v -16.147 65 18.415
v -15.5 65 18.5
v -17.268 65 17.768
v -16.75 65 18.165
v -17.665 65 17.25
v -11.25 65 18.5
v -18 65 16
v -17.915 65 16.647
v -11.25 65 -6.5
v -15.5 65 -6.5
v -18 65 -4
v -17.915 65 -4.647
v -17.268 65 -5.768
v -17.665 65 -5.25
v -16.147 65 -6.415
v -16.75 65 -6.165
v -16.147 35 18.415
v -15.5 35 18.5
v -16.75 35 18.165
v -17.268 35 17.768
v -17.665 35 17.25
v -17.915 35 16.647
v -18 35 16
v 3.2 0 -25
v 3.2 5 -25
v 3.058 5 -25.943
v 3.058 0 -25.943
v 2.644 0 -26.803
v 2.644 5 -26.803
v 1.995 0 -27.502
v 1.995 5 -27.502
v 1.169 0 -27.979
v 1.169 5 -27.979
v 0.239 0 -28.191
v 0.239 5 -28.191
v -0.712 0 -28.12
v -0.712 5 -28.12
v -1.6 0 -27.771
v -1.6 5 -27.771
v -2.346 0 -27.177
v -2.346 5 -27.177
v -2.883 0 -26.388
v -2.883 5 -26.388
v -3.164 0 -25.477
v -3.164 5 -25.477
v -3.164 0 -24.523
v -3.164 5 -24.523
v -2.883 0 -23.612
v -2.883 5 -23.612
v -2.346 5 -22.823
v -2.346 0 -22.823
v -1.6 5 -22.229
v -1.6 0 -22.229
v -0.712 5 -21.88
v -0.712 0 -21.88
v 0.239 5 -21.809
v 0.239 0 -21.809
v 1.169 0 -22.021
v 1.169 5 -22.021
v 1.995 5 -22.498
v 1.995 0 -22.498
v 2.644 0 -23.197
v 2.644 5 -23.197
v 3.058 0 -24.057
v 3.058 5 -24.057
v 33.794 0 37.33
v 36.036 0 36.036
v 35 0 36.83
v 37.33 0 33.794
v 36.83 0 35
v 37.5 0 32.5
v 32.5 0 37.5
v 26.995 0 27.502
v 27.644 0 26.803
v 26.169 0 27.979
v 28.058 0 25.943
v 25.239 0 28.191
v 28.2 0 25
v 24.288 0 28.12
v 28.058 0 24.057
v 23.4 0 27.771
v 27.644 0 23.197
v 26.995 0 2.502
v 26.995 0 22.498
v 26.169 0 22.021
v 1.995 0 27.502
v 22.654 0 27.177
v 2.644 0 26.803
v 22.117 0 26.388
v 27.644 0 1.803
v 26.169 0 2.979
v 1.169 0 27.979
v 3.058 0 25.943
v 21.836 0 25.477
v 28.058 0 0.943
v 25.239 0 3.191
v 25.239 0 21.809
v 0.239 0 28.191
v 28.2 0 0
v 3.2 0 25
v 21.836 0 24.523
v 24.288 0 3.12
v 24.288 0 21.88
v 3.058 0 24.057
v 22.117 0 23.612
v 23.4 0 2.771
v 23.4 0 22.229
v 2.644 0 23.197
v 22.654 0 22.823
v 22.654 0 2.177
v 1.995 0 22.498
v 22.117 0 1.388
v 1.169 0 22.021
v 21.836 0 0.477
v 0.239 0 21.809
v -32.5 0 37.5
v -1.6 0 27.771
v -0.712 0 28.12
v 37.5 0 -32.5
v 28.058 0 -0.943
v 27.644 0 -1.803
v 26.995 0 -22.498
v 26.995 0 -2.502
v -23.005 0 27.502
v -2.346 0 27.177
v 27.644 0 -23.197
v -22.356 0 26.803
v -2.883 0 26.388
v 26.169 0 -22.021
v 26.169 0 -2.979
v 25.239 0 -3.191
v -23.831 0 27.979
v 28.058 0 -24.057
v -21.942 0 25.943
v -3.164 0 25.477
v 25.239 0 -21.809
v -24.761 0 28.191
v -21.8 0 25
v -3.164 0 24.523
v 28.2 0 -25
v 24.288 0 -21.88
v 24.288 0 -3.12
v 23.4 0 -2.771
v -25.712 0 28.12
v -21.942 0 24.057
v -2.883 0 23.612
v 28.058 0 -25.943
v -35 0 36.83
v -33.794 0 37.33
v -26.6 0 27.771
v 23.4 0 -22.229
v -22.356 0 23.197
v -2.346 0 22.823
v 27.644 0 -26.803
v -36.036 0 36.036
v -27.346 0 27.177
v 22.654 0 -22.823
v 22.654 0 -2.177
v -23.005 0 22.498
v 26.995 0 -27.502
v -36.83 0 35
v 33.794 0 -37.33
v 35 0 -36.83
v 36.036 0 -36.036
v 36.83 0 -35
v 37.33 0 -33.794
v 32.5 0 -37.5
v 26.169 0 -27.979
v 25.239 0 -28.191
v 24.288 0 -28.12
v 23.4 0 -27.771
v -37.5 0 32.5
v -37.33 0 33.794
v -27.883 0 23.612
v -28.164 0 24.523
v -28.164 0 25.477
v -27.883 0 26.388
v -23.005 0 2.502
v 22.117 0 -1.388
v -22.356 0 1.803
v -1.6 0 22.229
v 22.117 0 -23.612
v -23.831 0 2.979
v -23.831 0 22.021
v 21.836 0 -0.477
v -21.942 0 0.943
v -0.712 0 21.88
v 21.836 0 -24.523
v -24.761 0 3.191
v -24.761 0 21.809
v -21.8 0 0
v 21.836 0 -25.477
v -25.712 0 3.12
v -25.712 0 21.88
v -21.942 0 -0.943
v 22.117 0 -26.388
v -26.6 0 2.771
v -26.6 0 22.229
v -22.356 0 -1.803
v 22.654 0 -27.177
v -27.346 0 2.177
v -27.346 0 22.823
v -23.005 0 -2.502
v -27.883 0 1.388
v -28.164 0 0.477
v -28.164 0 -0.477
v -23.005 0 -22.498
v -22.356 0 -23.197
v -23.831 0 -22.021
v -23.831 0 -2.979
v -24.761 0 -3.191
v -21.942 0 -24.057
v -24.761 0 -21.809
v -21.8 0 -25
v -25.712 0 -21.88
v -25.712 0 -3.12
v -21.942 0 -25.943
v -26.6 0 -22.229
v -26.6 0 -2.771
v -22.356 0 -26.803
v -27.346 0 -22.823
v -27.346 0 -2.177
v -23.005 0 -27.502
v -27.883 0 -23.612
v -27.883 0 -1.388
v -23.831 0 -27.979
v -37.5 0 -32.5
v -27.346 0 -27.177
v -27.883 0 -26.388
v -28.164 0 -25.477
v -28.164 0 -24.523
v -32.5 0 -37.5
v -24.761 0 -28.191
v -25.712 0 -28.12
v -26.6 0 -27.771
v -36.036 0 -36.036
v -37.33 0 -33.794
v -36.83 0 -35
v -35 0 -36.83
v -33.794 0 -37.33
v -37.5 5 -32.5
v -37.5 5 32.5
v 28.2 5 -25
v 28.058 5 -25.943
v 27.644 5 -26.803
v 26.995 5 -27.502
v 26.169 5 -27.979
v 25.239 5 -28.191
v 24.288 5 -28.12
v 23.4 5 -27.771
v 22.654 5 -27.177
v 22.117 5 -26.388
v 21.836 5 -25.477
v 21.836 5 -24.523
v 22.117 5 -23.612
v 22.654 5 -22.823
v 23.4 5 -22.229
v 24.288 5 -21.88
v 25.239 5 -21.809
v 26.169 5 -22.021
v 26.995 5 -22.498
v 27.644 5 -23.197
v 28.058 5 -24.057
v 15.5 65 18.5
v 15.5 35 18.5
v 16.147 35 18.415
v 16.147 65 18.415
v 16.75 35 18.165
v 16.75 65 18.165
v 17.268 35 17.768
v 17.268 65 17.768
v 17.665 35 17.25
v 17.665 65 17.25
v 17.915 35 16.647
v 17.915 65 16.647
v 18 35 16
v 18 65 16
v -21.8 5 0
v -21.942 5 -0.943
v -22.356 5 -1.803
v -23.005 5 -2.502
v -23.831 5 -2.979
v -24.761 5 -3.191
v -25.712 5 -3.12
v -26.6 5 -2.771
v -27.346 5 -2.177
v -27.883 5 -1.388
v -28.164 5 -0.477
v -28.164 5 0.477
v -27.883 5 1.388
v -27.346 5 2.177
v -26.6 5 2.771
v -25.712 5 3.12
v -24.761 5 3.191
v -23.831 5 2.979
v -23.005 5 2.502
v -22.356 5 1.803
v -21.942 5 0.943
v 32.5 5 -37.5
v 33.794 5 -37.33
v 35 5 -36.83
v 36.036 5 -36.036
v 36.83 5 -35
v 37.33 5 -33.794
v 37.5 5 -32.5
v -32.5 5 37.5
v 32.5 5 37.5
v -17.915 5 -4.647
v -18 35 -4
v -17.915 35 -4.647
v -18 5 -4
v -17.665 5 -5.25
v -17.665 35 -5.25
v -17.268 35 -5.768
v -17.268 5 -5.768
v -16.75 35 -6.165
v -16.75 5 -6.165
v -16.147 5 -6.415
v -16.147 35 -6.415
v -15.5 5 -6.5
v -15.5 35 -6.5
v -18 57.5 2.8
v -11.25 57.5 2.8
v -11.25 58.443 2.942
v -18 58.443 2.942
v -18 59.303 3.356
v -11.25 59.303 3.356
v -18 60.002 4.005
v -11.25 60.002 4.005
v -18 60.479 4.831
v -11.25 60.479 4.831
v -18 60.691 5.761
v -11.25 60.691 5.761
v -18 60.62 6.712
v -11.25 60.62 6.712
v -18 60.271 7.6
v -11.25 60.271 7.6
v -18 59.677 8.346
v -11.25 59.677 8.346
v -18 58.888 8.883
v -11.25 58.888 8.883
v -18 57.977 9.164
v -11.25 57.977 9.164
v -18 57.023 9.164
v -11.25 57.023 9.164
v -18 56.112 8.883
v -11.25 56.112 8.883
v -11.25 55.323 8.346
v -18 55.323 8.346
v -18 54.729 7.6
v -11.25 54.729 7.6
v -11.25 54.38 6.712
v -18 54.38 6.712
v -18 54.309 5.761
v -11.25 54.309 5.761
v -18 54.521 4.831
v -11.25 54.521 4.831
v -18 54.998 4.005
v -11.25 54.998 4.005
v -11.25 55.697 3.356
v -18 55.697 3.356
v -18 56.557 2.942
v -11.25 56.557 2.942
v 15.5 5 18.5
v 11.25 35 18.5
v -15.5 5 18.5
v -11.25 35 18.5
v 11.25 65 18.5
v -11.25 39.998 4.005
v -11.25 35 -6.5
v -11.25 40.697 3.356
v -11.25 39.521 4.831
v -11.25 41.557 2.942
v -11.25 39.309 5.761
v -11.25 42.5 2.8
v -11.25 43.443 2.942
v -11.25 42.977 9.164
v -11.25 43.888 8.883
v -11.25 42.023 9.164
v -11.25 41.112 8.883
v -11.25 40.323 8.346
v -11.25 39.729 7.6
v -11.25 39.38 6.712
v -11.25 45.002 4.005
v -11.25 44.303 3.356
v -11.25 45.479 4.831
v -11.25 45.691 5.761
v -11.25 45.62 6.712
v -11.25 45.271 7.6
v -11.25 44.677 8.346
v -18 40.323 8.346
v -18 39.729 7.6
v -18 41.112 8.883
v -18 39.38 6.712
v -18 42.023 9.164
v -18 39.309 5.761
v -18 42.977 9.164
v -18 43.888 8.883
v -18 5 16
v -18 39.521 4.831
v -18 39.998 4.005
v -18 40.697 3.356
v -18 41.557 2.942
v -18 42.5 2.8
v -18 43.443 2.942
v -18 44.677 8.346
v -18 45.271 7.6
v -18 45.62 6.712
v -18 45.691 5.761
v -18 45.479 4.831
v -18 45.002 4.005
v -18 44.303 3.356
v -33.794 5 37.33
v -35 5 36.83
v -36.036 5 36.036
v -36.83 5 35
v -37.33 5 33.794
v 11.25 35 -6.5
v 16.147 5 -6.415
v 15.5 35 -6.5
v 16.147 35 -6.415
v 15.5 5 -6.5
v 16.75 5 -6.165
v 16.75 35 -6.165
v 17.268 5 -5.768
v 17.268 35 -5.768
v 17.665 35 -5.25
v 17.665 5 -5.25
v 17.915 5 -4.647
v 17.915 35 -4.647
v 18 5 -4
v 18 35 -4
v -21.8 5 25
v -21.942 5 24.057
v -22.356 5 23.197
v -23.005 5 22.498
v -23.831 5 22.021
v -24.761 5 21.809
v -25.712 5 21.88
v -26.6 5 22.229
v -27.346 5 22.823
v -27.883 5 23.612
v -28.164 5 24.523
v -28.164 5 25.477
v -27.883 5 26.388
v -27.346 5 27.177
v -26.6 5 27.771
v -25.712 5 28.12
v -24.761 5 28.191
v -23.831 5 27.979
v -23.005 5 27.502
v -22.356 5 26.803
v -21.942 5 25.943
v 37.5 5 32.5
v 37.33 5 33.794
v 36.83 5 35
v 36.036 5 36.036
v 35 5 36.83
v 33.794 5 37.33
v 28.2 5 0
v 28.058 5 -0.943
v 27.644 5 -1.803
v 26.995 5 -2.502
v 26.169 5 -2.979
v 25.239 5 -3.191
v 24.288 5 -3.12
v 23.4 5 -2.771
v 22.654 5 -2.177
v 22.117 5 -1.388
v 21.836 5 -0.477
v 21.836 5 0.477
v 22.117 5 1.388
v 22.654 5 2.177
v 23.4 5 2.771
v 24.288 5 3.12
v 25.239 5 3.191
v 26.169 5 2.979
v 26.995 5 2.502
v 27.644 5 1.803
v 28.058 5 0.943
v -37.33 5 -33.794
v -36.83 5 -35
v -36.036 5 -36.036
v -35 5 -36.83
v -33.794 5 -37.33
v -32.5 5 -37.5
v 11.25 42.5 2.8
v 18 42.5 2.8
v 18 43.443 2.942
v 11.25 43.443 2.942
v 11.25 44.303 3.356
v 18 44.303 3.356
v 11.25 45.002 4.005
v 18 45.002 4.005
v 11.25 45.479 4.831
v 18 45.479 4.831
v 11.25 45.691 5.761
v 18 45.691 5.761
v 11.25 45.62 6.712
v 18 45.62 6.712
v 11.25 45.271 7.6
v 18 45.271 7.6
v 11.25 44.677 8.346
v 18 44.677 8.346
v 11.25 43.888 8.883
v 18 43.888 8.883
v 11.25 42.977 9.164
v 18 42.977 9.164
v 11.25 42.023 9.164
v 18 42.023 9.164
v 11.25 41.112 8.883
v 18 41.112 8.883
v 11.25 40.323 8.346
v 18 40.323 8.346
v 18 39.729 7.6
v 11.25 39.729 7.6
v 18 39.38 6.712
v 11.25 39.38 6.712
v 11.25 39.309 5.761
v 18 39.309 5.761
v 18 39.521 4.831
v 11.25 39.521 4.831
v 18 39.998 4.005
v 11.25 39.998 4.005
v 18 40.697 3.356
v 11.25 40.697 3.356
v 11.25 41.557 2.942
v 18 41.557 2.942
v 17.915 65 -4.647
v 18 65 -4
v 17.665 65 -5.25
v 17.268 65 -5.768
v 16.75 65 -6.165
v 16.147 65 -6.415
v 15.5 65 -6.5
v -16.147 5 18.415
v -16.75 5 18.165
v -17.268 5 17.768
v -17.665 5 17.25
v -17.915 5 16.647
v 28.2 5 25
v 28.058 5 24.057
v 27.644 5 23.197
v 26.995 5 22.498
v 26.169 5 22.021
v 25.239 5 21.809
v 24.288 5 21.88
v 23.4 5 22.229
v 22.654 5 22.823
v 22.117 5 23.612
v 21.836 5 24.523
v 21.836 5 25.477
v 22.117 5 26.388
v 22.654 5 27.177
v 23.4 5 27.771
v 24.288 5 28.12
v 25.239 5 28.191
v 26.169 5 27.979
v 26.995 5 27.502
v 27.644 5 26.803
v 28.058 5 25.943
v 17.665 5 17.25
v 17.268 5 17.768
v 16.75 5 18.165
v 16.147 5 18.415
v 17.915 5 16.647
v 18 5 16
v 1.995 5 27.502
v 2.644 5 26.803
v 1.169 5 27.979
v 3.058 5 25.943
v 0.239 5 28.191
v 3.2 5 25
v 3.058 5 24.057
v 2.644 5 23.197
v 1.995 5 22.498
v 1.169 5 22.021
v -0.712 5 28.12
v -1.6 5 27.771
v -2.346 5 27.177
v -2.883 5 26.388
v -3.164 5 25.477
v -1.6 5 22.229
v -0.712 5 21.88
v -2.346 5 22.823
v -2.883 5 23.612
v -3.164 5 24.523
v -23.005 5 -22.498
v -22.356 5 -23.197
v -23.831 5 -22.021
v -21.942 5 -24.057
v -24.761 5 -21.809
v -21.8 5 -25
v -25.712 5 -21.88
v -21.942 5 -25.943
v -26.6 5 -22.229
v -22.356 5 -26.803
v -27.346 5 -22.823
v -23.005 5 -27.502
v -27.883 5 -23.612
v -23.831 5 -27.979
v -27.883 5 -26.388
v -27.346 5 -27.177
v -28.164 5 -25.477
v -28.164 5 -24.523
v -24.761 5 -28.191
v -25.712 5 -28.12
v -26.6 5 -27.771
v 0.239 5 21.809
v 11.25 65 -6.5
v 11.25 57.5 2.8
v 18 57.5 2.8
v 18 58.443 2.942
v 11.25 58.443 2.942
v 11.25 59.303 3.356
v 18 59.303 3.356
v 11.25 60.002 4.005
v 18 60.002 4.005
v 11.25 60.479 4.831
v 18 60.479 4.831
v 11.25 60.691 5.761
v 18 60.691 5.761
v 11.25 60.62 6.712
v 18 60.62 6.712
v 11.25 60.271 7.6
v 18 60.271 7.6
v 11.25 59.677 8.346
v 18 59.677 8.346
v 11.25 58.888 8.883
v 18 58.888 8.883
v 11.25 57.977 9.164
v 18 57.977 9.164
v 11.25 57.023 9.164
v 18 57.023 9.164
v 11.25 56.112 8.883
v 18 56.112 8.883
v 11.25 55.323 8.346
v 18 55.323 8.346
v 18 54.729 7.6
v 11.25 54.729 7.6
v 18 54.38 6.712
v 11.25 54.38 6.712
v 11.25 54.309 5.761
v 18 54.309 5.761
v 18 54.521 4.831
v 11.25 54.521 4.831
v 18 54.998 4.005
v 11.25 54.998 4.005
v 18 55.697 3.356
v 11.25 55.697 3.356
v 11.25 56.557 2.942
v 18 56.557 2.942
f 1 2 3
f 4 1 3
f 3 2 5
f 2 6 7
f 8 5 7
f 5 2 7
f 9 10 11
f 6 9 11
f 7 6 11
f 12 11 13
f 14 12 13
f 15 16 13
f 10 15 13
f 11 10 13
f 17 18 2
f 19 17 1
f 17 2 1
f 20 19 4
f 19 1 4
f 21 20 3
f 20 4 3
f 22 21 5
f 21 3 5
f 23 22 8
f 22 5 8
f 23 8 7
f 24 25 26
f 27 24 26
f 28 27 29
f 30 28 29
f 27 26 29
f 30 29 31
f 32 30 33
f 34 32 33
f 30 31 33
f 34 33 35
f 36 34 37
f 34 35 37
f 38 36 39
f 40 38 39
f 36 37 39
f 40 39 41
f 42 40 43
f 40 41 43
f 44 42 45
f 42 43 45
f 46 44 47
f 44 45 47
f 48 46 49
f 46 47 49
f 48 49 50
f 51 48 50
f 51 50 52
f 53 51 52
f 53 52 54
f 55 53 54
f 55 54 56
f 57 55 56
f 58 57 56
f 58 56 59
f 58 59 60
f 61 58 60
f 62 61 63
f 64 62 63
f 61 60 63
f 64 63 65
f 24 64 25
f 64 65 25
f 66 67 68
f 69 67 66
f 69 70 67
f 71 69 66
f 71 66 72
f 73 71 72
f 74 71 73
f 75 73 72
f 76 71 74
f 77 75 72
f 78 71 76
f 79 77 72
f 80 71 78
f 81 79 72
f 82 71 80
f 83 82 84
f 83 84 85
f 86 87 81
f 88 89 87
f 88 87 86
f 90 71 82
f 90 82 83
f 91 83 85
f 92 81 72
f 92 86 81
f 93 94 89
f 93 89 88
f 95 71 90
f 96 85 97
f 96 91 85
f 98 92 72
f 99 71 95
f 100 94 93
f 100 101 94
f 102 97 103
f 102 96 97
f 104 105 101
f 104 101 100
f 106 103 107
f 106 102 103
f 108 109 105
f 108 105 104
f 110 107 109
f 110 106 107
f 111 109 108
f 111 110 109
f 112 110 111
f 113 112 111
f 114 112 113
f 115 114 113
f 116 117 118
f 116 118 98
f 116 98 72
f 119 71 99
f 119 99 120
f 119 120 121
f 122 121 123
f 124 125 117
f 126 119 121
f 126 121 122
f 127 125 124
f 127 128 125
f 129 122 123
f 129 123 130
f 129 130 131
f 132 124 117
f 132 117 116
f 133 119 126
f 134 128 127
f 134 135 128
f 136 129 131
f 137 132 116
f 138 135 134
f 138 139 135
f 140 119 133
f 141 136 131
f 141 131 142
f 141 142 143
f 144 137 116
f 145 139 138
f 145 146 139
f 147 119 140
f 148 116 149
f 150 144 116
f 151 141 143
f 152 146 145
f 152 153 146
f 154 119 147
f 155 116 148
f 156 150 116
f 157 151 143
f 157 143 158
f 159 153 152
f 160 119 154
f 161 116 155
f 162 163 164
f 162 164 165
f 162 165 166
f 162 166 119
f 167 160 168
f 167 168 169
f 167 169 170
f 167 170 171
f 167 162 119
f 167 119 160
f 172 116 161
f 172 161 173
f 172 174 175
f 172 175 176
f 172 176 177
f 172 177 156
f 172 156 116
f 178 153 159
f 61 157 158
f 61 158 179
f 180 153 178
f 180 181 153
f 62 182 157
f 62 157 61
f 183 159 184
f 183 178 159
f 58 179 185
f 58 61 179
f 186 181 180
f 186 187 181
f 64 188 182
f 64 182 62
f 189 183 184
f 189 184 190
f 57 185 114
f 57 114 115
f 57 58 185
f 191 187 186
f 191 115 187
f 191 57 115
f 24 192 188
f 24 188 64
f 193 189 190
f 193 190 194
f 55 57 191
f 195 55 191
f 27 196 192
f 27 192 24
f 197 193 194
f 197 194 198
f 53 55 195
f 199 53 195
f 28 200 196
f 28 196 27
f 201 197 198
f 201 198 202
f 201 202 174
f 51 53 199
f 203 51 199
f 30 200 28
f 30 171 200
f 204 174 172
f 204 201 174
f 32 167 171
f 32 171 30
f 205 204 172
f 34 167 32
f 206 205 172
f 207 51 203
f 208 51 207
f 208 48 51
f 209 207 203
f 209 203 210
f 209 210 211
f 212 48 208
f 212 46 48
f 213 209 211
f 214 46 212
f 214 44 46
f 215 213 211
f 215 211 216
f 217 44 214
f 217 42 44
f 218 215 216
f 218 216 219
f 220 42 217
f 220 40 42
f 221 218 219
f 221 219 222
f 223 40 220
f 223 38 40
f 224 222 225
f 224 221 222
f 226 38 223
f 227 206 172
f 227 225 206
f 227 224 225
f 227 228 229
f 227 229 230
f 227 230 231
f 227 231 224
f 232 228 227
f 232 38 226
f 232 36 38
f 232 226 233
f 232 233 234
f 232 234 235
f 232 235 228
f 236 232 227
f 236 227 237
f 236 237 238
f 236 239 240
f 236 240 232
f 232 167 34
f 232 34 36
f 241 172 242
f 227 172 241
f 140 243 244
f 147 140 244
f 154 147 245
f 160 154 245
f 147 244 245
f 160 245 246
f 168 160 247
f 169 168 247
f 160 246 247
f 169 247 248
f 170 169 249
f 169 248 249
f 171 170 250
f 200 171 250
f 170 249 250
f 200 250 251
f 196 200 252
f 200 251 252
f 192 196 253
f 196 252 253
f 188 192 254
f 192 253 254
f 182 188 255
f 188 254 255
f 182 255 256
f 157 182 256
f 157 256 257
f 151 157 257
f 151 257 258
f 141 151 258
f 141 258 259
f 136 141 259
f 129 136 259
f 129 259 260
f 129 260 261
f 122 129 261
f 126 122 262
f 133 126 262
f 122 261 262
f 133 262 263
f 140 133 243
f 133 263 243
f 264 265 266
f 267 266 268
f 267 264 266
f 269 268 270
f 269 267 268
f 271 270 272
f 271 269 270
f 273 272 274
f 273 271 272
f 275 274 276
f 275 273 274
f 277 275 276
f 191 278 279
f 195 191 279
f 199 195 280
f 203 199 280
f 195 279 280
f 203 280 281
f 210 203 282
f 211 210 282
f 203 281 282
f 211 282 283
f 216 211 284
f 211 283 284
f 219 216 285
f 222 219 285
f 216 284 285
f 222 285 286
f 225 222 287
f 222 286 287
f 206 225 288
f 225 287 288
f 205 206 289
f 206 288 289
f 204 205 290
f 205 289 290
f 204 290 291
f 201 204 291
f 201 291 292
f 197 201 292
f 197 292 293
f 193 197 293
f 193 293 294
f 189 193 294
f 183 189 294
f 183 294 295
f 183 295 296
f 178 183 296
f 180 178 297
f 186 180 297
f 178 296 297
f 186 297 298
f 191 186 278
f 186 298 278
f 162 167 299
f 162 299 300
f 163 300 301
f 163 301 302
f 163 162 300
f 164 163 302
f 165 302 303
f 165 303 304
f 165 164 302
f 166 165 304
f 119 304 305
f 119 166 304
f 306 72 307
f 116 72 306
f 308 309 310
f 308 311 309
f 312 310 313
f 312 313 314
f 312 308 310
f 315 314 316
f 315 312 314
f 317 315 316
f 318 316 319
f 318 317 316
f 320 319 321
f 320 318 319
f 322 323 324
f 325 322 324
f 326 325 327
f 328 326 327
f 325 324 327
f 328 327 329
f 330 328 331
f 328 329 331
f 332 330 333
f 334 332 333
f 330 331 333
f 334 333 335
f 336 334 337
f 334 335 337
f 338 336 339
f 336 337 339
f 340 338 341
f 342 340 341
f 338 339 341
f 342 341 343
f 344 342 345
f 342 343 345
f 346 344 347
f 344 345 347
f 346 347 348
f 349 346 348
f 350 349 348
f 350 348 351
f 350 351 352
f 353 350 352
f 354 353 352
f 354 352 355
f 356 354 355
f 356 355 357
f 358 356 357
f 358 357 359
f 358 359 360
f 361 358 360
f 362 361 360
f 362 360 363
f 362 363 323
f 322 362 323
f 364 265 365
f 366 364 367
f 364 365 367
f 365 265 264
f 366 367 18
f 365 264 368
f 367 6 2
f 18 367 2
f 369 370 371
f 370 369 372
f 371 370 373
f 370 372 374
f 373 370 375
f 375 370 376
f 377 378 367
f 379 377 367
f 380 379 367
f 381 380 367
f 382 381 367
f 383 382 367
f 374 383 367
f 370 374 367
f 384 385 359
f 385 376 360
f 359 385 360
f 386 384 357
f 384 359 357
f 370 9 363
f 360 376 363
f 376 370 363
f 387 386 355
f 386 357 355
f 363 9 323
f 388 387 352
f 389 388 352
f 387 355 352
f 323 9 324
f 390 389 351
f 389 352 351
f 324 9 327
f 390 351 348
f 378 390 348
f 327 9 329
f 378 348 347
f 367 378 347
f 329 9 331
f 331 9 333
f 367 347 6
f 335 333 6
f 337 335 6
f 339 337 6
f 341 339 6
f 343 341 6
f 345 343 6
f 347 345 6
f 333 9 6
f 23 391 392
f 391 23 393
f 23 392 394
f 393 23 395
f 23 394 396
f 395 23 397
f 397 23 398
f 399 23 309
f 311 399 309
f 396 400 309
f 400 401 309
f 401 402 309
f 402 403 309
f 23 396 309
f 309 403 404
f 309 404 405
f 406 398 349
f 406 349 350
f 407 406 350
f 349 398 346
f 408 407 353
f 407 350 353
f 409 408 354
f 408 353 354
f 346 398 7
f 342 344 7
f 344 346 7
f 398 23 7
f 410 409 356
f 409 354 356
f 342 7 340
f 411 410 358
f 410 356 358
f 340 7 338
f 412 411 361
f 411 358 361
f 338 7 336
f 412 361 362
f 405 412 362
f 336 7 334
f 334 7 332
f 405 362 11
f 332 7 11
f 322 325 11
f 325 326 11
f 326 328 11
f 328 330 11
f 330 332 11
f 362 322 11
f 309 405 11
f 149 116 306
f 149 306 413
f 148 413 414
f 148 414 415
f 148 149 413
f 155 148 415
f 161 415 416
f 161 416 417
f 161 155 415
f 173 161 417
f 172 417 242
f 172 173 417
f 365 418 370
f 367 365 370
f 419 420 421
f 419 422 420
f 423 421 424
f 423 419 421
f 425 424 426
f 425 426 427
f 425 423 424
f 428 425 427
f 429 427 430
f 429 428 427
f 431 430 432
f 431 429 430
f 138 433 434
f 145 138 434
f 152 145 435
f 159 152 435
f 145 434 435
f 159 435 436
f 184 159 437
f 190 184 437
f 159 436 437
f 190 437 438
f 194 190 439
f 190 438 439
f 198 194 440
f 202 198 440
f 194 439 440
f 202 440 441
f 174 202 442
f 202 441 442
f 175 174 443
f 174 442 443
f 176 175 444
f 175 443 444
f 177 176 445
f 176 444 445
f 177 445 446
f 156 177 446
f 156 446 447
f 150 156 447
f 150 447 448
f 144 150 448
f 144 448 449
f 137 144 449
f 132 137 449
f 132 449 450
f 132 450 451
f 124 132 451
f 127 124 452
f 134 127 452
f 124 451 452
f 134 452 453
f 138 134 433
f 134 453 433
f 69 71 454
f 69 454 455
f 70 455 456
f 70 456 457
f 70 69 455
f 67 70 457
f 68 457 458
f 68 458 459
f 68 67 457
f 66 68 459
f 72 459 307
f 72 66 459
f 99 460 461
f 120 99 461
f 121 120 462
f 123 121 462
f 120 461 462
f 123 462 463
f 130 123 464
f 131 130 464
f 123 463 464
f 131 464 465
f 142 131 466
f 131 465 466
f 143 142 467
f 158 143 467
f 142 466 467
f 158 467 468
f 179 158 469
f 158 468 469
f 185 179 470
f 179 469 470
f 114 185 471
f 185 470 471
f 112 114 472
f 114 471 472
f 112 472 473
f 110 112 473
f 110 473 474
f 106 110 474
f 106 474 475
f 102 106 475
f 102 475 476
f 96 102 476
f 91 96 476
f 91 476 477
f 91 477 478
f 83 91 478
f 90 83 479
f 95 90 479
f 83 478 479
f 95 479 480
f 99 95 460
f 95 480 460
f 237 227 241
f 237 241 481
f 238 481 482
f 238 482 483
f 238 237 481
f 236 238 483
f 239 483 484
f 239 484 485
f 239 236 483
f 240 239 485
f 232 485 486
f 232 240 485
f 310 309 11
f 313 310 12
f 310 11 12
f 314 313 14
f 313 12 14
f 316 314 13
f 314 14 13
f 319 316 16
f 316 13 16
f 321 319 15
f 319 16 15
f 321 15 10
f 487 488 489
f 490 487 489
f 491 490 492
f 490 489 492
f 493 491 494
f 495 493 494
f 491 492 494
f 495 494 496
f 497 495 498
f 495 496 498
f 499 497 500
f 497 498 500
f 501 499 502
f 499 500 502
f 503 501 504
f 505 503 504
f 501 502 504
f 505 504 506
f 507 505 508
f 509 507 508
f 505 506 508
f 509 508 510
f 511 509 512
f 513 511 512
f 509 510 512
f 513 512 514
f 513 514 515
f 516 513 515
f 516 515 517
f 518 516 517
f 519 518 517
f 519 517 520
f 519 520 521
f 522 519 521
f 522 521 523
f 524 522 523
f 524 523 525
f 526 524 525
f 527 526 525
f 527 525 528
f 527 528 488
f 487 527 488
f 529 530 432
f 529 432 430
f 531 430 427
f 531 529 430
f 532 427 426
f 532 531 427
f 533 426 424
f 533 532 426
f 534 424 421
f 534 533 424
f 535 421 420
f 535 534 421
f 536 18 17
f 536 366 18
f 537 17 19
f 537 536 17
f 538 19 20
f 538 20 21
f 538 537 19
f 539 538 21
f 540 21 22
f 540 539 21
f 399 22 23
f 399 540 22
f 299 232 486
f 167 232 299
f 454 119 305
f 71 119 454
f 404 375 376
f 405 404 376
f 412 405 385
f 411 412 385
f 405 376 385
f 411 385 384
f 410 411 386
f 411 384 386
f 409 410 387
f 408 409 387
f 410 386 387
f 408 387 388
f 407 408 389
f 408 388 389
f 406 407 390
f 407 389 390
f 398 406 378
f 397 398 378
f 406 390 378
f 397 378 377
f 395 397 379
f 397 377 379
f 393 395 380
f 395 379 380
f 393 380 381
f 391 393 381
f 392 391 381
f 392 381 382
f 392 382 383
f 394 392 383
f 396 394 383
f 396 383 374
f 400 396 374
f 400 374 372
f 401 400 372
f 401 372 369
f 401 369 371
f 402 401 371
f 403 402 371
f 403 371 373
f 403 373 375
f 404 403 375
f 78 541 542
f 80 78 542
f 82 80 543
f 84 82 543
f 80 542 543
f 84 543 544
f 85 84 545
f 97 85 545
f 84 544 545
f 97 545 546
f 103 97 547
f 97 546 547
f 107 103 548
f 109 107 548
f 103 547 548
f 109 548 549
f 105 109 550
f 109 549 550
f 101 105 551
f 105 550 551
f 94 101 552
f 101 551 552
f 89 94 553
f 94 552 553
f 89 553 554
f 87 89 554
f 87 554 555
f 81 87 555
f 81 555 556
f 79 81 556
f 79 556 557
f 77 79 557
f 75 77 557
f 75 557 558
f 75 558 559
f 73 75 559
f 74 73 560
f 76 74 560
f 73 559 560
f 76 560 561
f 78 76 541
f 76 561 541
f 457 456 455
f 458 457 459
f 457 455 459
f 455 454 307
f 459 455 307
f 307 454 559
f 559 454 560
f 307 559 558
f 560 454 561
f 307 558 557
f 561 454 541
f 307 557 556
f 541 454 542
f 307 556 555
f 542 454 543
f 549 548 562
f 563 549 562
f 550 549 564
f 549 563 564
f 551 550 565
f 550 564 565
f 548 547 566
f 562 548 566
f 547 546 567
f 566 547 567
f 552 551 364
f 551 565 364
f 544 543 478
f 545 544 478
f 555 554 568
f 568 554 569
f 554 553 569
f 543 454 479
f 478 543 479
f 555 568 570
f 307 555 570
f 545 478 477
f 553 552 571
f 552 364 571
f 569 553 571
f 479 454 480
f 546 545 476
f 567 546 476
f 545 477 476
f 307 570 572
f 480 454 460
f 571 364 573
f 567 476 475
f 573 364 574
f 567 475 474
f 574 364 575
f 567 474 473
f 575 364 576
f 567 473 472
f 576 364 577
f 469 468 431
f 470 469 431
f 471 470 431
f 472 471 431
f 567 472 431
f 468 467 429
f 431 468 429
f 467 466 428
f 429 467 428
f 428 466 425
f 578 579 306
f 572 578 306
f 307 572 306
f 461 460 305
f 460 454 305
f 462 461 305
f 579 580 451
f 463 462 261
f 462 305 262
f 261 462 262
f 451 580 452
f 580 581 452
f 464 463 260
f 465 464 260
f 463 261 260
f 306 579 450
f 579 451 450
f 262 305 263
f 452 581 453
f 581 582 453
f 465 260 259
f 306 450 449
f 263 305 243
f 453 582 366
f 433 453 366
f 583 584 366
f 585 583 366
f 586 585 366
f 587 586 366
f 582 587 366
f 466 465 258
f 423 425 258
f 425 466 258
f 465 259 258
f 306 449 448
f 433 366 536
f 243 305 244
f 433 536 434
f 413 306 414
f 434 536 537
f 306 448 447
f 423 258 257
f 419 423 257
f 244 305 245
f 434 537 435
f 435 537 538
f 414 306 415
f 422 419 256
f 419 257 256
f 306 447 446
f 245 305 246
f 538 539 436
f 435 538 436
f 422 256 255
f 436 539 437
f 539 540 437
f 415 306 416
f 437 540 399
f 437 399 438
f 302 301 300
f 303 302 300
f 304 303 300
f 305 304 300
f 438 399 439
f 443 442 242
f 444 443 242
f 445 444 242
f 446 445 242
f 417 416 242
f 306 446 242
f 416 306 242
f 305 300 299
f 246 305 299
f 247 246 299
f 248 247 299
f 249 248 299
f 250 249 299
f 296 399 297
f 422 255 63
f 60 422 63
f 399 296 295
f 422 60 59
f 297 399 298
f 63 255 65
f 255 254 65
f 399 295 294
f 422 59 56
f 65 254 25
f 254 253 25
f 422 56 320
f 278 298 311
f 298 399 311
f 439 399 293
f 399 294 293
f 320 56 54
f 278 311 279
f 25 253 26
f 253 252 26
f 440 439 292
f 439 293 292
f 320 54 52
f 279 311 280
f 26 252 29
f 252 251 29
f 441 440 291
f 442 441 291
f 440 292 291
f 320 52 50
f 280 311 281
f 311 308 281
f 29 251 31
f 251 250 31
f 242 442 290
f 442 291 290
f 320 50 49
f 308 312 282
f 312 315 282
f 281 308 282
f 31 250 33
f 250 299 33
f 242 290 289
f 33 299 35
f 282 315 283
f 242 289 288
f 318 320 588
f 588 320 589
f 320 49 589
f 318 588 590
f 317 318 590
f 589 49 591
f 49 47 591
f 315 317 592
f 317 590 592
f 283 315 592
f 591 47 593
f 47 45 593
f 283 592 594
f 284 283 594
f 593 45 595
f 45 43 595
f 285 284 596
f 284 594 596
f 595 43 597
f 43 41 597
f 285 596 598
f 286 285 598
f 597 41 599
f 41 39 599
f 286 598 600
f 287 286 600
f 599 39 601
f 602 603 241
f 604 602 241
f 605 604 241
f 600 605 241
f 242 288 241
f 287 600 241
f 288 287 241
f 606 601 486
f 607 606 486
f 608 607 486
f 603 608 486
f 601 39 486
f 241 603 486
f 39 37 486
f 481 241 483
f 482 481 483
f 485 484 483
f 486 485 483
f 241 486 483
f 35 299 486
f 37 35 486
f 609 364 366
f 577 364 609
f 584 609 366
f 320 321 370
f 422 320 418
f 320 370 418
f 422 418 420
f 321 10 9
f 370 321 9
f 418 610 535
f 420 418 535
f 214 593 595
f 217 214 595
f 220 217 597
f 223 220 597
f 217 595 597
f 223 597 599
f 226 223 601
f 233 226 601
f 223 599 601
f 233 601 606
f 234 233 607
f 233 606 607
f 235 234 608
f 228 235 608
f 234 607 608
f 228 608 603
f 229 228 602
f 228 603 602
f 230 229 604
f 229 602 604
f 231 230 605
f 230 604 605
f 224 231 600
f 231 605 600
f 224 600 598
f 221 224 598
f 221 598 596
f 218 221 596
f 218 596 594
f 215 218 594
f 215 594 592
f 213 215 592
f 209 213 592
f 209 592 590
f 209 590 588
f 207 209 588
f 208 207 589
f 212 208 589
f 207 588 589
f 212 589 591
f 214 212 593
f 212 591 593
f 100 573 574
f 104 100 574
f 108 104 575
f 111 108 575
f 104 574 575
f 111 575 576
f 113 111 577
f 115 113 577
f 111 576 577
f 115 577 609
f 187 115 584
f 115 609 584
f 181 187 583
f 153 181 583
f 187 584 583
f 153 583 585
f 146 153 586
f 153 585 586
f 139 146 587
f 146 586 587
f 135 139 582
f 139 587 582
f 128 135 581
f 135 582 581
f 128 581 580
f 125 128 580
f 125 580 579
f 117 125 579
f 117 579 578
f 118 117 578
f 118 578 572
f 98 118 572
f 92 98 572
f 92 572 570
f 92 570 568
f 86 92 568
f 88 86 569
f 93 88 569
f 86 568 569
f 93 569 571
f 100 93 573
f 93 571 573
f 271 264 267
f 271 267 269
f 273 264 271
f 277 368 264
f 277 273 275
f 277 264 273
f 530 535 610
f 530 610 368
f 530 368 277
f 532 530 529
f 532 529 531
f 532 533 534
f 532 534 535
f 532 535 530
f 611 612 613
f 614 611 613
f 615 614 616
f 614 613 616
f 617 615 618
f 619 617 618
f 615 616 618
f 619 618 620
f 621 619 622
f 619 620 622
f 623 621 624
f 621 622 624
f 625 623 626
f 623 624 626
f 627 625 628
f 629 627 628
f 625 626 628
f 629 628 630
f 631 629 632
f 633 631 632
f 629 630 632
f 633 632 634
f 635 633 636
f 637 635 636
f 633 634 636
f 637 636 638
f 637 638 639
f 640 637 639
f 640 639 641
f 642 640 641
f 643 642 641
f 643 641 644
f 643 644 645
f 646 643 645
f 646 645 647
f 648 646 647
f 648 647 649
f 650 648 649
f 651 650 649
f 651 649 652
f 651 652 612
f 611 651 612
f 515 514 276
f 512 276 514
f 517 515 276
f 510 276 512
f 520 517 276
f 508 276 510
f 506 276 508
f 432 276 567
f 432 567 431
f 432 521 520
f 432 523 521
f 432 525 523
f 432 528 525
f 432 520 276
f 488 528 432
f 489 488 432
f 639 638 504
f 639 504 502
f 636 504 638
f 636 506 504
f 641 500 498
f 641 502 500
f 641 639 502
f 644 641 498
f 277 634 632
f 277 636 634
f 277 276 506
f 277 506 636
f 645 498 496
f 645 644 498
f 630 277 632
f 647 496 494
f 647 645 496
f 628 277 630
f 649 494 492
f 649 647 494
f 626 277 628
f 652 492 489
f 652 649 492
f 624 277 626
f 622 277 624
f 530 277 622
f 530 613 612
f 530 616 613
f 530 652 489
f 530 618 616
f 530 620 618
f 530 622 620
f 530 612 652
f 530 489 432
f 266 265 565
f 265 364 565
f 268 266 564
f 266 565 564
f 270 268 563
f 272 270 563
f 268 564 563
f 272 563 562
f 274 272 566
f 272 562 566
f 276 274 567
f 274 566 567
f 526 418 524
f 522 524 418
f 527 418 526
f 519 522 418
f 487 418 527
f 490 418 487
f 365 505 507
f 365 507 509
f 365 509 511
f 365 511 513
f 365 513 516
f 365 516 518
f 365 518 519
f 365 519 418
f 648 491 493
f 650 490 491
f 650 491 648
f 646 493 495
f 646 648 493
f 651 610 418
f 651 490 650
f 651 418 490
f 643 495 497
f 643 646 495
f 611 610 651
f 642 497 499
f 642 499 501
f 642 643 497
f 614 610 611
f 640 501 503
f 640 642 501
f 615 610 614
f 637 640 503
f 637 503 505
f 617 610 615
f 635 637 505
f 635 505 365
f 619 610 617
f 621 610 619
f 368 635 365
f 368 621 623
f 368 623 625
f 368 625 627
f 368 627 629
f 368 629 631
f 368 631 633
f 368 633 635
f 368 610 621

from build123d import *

# Parameters (mm, degrees)
EXTRUDE_2_DEPTH     = 5
SKETCH_2_R          = 3.2
CUT_EXTRUDE_1_DEPTH = 5
SKETCH_4_W          = 36
SKETCH_4_H          = 25
EXTRUDE_3_DEPTH     = 30
FILLET_1_R          = 2.5
EXTRUDE_4_DEPTH     = 30
SKETCH_6_R          = 3.2
CUT_EXTRUDE_2_DEPTH = 36


with BuildPart() as part:
    # 스케치1 → 보스-돌출2 (new body)
    with BuildSketch(Plane(origin=(0, 0, 0), x_dir=(1, 0, 0), z_dir=(0, 1, 0))):
        with BuildLine():
            Line((-32.5, 37.5), (32.5, 37.5))
            ThreePointArc((32.5, 37.5), (36.035533906, 36.035533906), (37.5, 32.5))
            Line((37.5, 32.5), (37.5, -32.5))
            ThreePointArc((37.5, -32.5), (36.035533906, -36.035533906), (32.5, -37.5))
            Line((32.5, -37.5), (-32.5, -37.5))
            ThreePointArc((-32.5, -37.5), (-36.035533906, -36.035533906), (-37.5, -32.5))
            Line((-37.5, -32.5), (-37.5, 32.5))
            ThreePointArc((-37.5, 32.5), (-36.035533906, 36.035533906), (-32.5, 37.5))
        make_face()
    extrude(amount=EXTRUDE_2_DEPTH)

    # 스케치2 → 컷-돌출1 (cut)
    with BuildSketch(Plane(origin=(0, 5, 0), x_dir=(1, 0, 0), z_dir=(0, 1, 0))):
        with Locations((0, 25)):
            Circle(SKETCH_2_R)
        with Locations((-25, 25)):
            Circle(SKETCH_2_R)
        with Locations((-25, 0)):
            Circle(SKETCH_2_R)
        with Locations((-25, -25)):
            Circle(SKETCH_2_R)
        with Locations((0, -25)):
            Circle(SKETCH_2_R)
        with Locations((25, -25)):
            Circle(SKETCH_2_R)
        with Locations((25, 0)):
            Circle(SKETCH_2_R)
        with Locations((25, 25)):
            Circle(SKETCH_2_R)
    extrude(amount=-CUT_EXTRUDE_1_DEPTH, mode=Mode.SUBTRACT)

    # 스케치4 → 보스-돌출3 (add)
    with BuildSketch(Plane(origin=(0, 35, 0), x_dir=(-1, 0, 0), z_dir=(0, -1, 0))):
        with Locations((0, -6)):
            Rectangle(SKETCH_4_W, SKETCH_4_H)
    extrude(amount=EXTRUDE_3_DEPTH)

    # 필렛1
    fillet_1_edges = [part.edges().sort_by_distance(p)[0] for p in [
        (-18, 20, -6.5),
        (-18, 20, 18.5),
        (18, 20, 18.5),
        (18, 20, -6.5),
    ]]
    fillet(fillet_1_edges, radius=FILLET_1_R)

    # 스케치5 → 보스-돌출4 (add)
    with BuildSketch(Plane(origin=(0, 65, 0), x_dir=(-1, 0, 0), z_dir=(0, -1, 0))):
        with BuildLine():
            Line((18, -16), (18, 4))
            ThreePointArc((18, 4), (17.267766953, 5.767766953), (15.5, 6.5))
            Line((15.5, 6.5), (11.25, 6.5))
            Line((11.25, 6.5), (11.25, -18.5))
            Line((11.25, -18.5), (15.5, -18.5))
            ThreePointArc((15.5, -18.5), (17.267766953, -17.767766953), (18, -16))
        make_face()
        with BuildLine():
            Line((-18, -16), (-18, 4))
            ThreePointArc((-18, 4), (-17.267766953, 5.767766953), (-15.5, 6.5))
            Line((-15.5, 6.5), (-11.25, 6.5))
            Line((-11.25, 6.5), (-11.25, -18.5))
            Line((-11.25, -18.5), (-15.5, -18.5))
            ThreePointArc((-15.5, -18.5), (-17.267766953, -17.767766953), (-18, -16))
        make_face()
    extrude(amount=EXTRUDE_4_DEPTH)

    # 스케치6 → 컷-돌출2 (cut)
    with BuildSketch(Plane(origin=(18, 0, 0), x_dir=(0, 0, -1), z_dir=(1, 0, 0))):
        with Locations((-6, 57.5)):
            Circle(SKETCH_6_R)
        with Locations((-6, 42.5)):
            Circle(SKETCH_6_R)
    extrude(amount=-CUT_EXTRUDE_2_DEPTH, mode=Mode.SUBTRACT)


solid = part.part
